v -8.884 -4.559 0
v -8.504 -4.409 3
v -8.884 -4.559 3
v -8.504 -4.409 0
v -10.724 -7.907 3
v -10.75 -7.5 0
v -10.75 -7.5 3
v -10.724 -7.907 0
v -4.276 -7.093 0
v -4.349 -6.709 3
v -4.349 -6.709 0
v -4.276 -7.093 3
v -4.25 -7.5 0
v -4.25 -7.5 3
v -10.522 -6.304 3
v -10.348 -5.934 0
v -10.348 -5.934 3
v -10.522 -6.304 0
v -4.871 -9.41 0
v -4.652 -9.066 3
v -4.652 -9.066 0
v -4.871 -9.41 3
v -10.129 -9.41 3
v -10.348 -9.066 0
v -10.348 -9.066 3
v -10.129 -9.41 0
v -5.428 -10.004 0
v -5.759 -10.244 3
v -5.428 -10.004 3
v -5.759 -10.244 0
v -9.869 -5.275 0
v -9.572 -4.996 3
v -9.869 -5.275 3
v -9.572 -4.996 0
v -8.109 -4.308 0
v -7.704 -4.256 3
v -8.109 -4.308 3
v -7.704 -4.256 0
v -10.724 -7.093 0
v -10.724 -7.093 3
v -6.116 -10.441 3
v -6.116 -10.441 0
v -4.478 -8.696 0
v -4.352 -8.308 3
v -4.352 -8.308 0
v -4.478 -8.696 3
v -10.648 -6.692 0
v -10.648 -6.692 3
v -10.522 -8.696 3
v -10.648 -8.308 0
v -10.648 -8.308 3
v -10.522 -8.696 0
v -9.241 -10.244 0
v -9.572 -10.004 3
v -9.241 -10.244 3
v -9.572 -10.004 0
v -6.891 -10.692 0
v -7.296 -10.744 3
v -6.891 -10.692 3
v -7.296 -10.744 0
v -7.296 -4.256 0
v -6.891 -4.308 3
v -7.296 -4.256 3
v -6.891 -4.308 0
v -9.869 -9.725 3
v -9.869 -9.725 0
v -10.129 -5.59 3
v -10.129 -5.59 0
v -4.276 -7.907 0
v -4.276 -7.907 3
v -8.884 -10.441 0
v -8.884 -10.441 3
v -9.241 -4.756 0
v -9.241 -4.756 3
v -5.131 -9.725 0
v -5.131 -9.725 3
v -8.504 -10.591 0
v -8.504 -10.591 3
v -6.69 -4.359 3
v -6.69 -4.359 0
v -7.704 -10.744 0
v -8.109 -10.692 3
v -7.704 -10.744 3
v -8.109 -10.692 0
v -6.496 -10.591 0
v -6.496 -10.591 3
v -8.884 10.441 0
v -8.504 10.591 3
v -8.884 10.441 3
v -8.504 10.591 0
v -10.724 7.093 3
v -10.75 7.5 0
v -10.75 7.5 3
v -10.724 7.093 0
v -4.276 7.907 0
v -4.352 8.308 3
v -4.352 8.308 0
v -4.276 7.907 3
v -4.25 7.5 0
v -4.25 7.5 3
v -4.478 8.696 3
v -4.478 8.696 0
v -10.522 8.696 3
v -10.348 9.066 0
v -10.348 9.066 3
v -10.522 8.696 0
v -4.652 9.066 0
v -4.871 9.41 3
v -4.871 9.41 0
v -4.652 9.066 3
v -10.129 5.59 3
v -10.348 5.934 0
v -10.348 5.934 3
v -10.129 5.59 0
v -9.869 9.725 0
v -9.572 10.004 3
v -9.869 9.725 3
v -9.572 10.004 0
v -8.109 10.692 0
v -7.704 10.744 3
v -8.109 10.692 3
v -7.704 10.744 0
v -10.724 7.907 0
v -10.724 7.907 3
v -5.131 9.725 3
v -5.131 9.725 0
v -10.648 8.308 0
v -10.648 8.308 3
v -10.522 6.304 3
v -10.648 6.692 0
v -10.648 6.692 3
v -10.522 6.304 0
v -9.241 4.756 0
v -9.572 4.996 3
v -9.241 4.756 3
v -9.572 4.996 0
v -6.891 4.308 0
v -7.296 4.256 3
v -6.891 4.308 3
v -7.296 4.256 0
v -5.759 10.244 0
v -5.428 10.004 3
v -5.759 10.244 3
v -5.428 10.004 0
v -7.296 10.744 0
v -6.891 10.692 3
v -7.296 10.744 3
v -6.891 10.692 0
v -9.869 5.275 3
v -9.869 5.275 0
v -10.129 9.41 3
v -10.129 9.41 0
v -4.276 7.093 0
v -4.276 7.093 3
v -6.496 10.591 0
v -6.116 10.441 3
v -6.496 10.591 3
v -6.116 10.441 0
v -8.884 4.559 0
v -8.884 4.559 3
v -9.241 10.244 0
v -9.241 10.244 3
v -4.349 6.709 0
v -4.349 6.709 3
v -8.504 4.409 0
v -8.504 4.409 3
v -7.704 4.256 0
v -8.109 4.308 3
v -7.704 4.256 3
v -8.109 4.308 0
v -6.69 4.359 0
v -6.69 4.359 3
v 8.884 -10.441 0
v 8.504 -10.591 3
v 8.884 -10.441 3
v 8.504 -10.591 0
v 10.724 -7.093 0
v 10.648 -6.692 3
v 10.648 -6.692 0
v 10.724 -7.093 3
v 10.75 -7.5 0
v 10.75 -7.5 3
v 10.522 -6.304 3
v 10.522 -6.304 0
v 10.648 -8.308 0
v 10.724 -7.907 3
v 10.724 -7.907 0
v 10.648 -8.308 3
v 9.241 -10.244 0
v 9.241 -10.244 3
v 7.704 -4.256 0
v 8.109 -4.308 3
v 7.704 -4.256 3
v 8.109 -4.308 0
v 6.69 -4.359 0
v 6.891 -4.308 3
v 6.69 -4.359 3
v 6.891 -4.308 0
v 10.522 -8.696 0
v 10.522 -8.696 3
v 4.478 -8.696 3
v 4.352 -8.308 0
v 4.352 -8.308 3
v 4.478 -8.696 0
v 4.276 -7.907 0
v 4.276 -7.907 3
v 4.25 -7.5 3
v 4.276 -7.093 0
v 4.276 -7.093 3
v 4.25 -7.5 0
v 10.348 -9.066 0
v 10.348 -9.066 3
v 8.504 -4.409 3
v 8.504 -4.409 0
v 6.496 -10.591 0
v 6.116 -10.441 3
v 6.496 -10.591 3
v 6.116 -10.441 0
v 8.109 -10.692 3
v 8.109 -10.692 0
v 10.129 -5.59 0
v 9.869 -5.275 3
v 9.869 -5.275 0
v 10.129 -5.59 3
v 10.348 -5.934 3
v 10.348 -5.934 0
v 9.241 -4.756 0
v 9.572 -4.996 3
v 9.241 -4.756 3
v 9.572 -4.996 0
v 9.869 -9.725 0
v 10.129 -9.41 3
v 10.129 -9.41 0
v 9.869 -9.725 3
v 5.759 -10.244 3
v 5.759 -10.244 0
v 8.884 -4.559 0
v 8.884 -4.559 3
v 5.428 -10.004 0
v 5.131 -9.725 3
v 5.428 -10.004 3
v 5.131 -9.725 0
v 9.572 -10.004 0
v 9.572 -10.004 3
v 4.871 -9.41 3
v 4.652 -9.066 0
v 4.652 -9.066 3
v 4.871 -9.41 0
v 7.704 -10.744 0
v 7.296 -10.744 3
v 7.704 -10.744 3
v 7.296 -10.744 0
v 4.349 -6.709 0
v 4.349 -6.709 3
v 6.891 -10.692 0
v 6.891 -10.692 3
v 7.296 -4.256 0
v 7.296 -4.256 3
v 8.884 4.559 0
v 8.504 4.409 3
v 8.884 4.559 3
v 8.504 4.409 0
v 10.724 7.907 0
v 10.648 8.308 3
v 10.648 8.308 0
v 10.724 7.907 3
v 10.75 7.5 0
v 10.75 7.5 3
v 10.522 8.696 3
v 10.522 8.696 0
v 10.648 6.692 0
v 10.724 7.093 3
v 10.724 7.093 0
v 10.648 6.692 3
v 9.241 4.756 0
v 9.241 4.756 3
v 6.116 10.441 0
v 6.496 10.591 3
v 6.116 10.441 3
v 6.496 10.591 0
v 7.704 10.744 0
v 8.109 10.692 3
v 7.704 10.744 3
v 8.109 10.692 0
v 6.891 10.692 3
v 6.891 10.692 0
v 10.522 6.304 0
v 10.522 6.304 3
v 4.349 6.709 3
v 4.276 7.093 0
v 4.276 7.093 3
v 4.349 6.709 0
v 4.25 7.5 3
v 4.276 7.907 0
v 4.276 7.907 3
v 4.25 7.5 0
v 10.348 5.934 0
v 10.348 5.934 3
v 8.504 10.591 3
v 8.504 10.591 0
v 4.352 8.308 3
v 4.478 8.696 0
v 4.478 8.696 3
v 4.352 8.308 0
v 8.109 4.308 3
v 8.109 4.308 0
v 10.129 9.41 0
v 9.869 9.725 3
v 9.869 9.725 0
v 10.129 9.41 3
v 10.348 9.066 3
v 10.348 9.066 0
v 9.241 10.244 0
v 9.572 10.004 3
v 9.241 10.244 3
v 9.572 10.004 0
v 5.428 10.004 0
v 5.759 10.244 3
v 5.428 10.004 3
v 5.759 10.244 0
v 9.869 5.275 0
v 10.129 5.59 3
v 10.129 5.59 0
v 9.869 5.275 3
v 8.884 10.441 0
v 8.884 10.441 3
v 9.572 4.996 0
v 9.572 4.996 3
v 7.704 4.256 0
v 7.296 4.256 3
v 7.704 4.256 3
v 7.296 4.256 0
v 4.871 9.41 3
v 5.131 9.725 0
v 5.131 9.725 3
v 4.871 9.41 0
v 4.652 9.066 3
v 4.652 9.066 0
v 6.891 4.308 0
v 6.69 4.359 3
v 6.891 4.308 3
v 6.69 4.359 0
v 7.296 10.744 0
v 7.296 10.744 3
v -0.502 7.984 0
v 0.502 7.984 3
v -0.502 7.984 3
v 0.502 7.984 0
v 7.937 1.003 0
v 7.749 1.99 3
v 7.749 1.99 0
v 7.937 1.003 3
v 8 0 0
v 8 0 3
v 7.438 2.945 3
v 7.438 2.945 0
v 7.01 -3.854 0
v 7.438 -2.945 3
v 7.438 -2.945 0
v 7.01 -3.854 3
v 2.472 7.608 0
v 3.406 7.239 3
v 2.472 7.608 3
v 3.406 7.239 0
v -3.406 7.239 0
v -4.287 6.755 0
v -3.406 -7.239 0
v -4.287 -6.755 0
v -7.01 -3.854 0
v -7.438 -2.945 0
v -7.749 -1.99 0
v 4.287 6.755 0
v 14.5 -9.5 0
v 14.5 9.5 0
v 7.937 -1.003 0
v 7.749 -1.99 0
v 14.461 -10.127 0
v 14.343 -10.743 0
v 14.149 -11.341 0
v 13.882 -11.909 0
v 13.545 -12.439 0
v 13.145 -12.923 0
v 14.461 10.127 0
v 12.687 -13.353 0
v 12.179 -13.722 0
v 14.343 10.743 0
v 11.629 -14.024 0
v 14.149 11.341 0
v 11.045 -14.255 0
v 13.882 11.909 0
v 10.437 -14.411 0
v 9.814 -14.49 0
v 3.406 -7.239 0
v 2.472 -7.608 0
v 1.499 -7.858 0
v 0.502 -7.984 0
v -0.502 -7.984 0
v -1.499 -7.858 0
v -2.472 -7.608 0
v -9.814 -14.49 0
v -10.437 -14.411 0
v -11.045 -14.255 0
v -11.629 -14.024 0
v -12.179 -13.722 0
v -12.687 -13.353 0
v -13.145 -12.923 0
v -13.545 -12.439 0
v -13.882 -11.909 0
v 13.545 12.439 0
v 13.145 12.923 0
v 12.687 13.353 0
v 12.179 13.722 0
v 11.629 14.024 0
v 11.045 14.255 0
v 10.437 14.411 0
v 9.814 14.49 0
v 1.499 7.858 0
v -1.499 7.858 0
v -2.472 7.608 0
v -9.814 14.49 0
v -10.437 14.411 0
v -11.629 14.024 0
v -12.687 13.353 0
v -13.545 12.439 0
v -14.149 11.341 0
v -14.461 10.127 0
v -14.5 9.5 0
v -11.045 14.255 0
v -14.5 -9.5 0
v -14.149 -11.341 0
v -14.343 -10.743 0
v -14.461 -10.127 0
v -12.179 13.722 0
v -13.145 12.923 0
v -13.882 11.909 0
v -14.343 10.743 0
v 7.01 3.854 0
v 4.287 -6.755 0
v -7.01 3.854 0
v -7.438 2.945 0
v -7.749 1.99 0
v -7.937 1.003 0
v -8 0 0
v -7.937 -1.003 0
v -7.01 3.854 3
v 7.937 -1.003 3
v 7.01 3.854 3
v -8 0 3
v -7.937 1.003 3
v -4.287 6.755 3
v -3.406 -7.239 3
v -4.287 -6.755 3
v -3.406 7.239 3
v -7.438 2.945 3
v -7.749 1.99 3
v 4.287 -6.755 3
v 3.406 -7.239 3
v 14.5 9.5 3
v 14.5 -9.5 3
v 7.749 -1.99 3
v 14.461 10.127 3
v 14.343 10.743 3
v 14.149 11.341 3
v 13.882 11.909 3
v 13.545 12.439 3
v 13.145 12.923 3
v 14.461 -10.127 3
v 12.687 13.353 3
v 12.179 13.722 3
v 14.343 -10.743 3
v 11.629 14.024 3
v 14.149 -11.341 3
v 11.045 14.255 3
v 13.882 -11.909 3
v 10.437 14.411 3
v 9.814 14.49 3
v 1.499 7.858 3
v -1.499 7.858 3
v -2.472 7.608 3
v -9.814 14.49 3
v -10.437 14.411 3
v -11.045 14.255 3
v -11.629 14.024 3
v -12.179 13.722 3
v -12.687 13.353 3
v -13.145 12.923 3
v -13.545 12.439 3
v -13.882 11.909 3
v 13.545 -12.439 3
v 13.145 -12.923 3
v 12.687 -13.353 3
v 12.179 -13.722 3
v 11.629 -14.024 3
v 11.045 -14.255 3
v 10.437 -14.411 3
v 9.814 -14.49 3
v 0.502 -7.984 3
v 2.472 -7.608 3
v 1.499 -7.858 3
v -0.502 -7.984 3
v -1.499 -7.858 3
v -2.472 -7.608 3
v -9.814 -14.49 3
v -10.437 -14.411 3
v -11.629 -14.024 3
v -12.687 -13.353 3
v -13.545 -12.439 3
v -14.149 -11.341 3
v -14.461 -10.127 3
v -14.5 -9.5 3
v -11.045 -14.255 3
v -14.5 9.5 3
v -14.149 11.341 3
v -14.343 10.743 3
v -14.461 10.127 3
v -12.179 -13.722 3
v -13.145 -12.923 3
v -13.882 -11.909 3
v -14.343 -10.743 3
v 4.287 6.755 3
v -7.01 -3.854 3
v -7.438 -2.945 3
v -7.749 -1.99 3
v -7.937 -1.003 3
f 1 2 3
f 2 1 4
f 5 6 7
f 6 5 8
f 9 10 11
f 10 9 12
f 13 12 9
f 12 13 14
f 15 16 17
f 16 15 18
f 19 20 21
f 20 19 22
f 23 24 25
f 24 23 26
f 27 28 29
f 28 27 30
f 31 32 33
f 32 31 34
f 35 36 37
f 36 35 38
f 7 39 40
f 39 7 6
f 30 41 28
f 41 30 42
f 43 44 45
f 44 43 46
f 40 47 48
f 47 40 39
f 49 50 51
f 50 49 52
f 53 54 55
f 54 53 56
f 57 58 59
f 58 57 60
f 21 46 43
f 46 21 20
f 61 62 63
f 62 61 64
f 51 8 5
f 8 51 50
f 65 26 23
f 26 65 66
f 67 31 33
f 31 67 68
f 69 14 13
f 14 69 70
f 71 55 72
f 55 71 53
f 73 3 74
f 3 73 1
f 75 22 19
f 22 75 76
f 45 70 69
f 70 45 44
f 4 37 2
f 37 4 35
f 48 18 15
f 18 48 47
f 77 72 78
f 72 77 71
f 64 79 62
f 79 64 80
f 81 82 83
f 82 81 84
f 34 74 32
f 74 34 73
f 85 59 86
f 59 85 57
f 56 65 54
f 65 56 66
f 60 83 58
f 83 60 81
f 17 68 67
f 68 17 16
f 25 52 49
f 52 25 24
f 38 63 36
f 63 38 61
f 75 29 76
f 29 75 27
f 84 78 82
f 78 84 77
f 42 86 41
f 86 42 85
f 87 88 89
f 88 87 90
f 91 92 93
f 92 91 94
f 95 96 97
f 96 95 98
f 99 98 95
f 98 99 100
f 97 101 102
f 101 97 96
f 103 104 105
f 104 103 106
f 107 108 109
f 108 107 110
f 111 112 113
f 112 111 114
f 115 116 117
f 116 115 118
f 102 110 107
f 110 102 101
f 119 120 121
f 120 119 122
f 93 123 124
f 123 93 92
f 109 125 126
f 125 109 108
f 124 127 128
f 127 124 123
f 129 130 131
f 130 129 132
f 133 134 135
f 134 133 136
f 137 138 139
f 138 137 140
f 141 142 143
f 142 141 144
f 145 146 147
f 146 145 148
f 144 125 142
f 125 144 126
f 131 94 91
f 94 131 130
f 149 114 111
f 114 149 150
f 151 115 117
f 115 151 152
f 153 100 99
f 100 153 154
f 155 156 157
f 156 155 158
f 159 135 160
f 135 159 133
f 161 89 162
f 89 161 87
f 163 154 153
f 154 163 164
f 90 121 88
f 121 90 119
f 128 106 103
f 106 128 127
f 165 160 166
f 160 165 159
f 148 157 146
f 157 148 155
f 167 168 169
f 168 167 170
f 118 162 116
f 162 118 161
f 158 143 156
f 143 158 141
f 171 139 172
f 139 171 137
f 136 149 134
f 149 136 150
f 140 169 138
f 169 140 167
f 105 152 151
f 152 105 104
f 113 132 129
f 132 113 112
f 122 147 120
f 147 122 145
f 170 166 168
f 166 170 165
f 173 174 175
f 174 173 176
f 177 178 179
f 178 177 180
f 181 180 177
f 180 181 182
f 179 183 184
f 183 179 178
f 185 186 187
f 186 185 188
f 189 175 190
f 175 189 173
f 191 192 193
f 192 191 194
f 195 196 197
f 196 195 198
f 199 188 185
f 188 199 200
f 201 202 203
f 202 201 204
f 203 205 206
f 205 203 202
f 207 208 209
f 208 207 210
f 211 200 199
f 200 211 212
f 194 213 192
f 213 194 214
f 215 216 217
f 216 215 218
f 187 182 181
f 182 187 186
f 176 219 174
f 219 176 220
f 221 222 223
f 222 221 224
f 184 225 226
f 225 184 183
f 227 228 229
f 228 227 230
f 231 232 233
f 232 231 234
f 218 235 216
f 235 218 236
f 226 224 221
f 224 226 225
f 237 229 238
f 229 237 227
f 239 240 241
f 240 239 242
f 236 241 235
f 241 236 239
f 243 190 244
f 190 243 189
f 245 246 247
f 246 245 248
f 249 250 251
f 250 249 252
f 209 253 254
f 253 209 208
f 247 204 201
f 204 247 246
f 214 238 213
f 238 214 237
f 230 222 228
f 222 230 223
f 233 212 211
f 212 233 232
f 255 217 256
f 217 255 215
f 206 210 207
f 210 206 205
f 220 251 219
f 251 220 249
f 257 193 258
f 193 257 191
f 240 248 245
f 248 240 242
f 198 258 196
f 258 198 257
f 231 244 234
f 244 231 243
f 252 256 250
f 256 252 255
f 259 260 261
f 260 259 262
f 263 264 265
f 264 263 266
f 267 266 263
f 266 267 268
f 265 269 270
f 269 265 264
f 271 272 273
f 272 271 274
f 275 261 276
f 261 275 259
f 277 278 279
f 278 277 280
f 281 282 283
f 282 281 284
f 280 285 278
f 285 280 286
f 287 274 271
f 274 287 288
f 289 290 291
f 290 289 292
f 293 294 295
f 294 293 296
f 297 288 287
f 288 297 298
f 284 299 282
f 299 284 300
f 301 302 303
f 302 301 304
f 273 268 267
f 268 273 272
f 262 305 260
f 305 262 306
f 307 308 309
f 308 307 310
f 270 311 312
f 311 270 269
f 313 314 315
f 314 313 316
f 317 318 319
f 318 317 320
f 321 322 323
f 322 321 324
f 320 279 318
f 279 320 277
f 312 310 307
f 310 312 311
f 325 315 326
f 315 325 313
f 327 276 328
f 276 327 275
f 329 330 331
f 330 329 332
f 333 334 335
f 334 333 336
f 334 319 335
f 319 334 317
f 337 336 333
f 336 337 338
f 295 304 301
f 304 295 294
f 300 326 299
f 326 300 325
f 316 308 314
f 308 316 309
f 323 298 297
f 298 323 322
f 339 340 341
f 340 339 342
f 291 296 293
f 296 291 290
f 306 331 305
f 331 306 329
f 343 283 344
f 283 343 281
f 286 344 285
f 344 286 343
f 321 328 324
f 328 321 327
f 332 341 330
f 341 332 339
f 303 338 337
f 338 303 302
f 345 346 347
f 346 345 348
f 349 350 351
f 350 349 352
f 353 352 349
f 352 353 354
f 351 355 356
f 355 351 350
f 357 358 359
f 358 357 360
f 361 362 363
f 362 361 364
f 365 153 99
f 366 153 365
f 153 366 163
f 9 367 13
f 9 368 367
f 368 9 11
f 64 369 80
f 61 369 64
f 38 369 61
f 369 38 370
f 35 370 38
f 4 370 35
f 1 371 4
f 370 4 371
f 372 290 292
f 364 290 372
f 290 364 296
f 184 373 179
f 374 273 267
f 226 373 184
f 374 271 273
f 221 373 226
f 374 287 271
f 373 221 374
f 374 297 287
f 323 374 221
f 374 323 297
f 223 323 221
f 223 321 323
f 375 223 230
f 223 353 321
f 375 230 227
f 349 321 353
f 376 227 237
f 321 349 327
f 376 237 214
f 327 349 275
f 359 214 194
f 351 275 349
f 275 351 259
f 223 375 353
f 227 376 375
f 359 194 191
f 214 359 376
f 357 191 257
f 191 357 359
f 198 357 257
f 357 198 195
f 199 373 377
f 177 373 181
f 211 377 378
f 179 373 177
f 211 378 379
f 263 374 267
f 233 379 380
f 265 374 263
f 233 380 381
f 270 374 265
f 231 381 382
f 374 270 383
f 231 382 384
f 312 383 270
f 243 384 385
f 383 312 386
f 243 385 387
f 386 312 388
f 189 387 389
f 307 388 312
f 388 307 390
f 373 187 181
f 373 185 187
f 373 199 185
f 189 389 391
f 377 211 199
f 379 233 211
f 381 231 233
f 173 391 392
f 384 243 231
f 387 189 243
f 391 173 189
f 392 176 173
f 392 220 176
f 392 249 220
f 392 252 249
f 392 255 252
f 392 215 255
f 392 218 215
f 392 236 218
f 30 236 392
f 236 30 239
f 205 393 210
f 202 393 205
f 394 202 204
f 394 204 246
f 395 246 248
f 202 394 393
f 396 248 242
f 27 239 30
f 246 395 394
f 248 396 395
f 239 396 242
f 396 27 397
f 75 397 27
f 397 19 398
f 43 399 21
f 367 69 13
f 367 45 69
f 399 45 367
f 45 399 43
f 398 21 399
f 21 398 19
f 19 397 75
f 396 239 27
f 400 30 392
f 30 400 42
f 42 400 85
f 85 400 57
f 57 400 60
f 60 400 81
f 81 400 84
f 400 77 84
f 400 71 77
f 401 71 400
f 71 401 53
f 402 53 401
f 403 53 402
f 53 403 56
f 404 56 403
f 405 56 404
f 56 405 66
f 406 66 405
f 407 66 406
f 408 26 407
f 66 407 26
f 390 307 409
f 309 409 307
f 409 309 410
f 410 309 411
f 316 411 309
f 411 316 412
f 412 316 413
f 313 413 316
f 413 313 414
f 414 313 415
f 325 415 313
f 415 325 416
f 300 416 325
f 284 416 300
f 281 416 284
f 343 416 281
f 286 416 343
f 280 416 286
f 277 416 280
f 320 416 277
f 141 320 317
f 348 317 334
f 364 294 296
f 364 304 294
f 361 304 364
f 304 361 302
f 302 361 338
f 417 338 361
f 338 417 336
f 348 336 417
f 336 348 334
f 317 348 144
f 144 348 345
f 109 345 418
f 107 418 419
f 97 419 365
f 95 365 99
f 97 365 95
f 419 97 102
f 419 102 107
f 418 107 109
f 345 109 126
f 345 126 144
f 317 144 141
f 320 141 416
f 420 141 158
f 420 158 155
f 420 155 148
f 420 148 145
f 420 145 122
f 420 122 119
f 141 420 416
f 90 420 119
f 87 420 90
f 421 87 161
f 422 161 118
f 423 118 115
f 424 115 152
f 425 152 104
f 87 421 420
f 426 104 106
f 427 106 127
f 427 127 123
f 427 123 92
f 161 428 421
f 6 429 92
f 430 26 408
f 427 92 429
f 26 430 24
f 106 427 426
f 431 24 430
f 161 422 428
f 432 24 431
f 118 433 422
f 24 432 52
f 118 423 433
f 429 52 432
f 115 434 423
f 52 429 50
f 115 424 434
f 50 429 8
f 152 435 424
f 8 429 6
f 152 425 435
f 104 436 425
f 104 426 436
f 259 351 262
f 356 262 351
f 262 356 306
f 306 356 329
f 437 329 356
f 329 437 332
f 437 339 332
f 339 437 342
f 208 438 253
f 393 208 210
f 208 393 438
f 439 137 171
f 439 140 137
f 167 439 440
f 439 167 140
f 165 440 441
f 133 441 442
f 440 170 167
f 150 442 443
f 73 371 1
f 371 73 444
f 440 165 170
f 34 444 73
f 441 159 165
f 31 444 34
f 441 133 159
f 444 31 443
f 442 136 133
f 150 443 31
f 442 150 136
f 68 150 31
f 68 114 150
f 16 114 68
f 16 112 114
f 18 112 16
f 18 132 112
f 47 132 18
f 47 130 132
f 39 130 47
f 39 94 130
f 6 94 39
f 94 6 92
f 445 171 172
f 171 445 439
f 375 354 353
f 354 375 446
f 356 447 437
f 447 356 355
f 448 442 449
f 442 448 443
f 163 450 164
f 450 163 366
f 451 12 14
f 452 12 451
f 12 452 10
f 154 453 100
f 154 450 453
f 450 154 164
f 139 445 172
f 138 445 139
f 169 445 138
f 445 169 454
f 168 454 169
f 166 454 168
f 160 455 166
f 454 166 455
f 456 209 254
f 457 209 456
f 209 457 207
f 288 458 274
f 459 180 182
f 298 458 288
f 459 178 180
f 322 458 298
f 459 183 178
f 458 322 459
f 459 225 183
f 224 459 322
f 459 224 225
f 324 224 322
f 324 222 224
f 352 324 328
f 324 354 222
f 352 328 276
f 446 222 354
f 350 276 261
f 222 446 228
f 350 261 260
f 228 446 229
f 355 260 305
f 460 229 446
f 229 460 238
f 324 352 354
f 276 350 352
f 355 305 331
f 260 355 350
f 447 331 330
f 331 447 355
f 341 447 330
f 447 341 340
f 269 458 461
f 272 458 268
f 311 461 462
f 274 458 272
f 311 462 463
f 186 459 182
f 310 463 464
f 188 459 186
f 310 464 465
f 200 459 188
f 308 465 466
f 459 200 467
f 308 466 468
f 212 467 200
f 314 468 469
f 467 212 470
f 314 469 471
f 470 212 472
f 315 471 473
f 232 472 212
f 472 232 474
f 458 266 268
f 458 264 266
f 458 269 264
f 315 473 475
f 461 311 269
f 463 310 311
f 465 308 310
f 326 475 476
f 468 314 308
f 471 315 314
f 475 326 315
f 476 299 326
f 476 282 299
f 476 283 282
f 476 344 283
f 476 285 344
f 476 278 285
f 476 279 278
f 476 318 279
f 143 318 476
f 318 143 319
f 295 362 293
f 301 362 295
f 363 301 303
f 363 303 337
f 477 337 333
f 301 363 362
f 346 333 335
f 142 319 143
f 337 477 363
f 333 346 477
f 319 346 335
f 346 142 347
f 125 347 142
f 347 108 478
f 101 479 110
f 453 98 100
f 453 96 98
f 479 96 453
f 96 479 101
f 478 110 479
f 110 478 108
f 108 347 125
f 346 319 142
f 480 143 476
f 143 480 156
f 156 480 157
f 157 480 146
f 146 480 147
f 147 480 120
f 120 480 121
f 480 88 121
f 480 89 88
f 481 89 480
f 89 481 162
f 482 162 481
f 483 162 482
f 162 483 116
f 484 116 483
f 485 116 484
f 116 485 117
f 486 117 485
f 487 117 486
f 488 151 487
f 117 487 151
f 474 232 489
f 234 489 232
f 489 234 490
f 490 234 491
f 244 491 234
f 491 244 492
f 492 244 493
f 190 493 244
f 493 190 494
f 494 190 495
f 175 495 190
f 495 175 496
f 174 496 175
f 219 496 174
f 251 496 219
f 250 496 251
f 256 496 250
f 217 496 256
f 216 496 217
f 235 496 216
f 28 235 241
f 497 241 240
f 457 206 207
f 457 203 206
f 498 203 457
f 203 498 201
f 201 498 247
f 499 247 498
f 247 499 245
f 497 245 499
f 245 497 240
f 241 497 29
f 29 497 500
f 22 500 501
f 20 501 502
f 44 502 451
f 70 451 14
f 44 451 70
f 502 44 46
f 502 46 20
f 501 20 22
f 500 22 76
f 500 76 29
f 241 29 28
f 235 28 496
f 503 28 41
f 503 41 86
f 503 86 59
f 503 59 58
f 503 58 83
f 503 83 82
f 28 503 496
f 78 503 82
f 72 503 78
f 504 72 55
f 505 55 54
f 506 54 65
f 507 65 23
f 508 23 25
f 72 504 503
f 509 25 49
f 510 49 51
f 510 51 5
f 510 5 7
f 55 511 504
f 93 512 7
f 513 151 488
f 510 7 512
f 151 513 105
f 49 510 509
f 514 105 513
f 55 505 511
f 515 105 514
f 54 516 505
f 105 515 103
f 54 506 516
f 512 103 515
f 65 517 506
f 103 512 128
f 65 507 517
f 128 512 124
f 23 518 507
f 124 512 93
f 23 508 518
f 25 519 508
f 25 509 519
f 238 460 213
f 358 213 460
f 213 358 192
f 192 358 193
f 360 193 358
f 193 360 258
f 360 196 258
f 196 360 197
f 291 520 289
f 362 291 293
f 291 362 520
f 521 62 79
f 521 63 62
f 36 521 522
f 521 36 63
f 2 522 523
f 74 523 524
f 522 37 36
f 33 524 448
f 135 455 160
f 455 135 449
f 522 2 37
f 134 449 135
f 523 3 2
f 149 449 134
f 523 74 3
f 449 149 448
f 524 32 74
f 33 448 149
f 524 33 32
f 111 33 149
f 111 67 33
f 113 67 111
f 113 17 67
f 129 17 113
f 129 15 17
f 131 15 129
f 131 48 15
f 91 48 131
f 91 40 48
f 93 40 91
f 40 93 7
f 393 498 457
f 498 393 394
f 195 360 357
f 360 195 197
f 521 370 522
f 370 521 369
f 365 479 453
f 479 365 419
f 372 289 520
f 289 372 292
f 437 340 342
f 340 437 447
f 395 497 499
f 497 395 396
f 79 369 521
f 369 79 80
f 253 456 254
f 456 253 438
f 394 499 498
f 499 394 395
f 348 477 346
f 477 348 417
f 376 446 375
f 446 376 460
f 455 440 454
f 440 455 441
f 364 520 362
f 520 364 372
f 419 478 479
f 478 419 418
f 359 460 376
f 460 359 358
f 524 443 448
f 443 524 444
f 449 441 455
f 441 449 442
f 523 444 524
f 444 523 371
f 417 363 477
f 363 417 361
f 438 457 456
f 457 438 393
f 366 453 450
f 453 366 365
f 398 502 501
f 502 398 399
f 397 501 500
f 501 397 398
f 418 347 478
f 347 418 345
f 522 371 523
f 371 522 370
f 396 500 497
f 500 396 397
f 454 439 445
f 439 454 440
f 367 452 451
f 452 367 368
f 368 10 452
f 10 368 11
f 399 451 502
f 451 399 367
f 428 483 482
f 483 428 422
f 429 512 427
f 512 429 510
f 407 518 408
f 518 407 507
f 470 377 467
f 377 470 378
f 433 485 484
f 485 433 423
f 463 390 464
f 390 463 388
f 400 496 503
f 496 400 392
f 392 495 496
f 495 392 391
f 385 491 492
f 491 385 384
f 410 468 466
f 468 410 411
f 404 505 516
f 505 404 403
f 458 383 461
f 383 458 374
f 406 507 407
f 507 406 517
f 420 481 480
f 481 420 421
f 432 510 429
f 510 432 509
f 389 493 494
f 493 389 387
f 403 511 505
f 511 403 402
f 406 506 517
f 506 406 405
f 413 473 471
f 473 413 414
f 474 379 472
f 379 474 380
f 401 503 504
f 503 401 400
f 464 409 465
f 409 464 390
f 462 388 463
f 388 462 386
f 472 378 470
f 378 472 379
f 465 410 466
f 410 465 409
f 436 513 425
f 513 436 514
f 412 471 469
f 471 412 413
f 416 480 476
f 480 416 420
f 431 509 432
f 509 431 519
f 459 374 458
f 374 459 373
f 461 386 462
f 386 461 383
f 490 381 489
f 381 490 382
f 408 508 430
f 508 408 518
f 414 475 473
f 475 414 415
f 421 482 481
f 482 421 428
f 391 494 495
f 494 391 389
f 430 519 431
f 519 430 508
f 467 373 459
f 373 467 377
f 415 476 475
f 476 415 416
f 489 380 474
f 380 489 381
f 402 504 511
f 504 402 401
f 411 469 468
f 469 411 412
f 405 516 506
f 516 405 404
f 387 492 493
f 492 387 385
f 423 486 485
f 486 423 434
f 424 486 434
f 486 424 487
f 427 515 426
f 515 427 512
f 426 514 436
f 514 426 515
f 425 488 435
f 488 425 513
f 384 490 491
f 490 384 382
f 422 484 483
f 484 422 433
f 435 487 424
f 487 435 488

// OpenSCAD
$fn = 50;

difference() {
	union() {
		hull() {
			translate(v = [-9.5, 9.5, 0]) {
				cylinder(h = 3, r = 5);
			}
			translate(v = [9.5, 9.5, 0]) {
				cylinder(h = 3, r = 5);
			}
			translate(v = [-9.5, -9.5, 0]) {
				cylinder(h = 3, r = 5);
			}
			translate(v = [9.5, -9.5, 0]) {
				cylinder(h = 3, r = 5);
			}
		}
	}
	union() {
		translate(v = [-7.5, -7.5, -100.0]) {
			cylinder(h = 200, r = 3.25);
		}
		translate(v = [-7.5, 7.5, -100.0]) {
			cylinder(h = 200, r = 3.25);
		}
		translate(v = [7.5, -7.5, -100.0]) {
			cylinder(h = 200, r = 3.25);
		}
		translate(v = [7.5, 7.5, -100.0]) {
			cylinder(h = 200, r = 3.25);
		}
		translate(v = [-7.5, -7.5, -100.0]) {
			cylinder(h = 200, r = 1.8);
		}
		translate(v = [-7.5, 7.5, -100.0]) {
			cylinder(h = 200, r = 1.8);
		}
		translate(v = [7.5, -7.5, -100.0]) {
			cylinder(h = 200, r = 1.8);
		}
		translate(v = [7.5, 7.5, -100.0]) {
			cylinder(h = 200, r = 1.8);
		}
		cylinder(h = 3, r = 8.0);
	}
}
